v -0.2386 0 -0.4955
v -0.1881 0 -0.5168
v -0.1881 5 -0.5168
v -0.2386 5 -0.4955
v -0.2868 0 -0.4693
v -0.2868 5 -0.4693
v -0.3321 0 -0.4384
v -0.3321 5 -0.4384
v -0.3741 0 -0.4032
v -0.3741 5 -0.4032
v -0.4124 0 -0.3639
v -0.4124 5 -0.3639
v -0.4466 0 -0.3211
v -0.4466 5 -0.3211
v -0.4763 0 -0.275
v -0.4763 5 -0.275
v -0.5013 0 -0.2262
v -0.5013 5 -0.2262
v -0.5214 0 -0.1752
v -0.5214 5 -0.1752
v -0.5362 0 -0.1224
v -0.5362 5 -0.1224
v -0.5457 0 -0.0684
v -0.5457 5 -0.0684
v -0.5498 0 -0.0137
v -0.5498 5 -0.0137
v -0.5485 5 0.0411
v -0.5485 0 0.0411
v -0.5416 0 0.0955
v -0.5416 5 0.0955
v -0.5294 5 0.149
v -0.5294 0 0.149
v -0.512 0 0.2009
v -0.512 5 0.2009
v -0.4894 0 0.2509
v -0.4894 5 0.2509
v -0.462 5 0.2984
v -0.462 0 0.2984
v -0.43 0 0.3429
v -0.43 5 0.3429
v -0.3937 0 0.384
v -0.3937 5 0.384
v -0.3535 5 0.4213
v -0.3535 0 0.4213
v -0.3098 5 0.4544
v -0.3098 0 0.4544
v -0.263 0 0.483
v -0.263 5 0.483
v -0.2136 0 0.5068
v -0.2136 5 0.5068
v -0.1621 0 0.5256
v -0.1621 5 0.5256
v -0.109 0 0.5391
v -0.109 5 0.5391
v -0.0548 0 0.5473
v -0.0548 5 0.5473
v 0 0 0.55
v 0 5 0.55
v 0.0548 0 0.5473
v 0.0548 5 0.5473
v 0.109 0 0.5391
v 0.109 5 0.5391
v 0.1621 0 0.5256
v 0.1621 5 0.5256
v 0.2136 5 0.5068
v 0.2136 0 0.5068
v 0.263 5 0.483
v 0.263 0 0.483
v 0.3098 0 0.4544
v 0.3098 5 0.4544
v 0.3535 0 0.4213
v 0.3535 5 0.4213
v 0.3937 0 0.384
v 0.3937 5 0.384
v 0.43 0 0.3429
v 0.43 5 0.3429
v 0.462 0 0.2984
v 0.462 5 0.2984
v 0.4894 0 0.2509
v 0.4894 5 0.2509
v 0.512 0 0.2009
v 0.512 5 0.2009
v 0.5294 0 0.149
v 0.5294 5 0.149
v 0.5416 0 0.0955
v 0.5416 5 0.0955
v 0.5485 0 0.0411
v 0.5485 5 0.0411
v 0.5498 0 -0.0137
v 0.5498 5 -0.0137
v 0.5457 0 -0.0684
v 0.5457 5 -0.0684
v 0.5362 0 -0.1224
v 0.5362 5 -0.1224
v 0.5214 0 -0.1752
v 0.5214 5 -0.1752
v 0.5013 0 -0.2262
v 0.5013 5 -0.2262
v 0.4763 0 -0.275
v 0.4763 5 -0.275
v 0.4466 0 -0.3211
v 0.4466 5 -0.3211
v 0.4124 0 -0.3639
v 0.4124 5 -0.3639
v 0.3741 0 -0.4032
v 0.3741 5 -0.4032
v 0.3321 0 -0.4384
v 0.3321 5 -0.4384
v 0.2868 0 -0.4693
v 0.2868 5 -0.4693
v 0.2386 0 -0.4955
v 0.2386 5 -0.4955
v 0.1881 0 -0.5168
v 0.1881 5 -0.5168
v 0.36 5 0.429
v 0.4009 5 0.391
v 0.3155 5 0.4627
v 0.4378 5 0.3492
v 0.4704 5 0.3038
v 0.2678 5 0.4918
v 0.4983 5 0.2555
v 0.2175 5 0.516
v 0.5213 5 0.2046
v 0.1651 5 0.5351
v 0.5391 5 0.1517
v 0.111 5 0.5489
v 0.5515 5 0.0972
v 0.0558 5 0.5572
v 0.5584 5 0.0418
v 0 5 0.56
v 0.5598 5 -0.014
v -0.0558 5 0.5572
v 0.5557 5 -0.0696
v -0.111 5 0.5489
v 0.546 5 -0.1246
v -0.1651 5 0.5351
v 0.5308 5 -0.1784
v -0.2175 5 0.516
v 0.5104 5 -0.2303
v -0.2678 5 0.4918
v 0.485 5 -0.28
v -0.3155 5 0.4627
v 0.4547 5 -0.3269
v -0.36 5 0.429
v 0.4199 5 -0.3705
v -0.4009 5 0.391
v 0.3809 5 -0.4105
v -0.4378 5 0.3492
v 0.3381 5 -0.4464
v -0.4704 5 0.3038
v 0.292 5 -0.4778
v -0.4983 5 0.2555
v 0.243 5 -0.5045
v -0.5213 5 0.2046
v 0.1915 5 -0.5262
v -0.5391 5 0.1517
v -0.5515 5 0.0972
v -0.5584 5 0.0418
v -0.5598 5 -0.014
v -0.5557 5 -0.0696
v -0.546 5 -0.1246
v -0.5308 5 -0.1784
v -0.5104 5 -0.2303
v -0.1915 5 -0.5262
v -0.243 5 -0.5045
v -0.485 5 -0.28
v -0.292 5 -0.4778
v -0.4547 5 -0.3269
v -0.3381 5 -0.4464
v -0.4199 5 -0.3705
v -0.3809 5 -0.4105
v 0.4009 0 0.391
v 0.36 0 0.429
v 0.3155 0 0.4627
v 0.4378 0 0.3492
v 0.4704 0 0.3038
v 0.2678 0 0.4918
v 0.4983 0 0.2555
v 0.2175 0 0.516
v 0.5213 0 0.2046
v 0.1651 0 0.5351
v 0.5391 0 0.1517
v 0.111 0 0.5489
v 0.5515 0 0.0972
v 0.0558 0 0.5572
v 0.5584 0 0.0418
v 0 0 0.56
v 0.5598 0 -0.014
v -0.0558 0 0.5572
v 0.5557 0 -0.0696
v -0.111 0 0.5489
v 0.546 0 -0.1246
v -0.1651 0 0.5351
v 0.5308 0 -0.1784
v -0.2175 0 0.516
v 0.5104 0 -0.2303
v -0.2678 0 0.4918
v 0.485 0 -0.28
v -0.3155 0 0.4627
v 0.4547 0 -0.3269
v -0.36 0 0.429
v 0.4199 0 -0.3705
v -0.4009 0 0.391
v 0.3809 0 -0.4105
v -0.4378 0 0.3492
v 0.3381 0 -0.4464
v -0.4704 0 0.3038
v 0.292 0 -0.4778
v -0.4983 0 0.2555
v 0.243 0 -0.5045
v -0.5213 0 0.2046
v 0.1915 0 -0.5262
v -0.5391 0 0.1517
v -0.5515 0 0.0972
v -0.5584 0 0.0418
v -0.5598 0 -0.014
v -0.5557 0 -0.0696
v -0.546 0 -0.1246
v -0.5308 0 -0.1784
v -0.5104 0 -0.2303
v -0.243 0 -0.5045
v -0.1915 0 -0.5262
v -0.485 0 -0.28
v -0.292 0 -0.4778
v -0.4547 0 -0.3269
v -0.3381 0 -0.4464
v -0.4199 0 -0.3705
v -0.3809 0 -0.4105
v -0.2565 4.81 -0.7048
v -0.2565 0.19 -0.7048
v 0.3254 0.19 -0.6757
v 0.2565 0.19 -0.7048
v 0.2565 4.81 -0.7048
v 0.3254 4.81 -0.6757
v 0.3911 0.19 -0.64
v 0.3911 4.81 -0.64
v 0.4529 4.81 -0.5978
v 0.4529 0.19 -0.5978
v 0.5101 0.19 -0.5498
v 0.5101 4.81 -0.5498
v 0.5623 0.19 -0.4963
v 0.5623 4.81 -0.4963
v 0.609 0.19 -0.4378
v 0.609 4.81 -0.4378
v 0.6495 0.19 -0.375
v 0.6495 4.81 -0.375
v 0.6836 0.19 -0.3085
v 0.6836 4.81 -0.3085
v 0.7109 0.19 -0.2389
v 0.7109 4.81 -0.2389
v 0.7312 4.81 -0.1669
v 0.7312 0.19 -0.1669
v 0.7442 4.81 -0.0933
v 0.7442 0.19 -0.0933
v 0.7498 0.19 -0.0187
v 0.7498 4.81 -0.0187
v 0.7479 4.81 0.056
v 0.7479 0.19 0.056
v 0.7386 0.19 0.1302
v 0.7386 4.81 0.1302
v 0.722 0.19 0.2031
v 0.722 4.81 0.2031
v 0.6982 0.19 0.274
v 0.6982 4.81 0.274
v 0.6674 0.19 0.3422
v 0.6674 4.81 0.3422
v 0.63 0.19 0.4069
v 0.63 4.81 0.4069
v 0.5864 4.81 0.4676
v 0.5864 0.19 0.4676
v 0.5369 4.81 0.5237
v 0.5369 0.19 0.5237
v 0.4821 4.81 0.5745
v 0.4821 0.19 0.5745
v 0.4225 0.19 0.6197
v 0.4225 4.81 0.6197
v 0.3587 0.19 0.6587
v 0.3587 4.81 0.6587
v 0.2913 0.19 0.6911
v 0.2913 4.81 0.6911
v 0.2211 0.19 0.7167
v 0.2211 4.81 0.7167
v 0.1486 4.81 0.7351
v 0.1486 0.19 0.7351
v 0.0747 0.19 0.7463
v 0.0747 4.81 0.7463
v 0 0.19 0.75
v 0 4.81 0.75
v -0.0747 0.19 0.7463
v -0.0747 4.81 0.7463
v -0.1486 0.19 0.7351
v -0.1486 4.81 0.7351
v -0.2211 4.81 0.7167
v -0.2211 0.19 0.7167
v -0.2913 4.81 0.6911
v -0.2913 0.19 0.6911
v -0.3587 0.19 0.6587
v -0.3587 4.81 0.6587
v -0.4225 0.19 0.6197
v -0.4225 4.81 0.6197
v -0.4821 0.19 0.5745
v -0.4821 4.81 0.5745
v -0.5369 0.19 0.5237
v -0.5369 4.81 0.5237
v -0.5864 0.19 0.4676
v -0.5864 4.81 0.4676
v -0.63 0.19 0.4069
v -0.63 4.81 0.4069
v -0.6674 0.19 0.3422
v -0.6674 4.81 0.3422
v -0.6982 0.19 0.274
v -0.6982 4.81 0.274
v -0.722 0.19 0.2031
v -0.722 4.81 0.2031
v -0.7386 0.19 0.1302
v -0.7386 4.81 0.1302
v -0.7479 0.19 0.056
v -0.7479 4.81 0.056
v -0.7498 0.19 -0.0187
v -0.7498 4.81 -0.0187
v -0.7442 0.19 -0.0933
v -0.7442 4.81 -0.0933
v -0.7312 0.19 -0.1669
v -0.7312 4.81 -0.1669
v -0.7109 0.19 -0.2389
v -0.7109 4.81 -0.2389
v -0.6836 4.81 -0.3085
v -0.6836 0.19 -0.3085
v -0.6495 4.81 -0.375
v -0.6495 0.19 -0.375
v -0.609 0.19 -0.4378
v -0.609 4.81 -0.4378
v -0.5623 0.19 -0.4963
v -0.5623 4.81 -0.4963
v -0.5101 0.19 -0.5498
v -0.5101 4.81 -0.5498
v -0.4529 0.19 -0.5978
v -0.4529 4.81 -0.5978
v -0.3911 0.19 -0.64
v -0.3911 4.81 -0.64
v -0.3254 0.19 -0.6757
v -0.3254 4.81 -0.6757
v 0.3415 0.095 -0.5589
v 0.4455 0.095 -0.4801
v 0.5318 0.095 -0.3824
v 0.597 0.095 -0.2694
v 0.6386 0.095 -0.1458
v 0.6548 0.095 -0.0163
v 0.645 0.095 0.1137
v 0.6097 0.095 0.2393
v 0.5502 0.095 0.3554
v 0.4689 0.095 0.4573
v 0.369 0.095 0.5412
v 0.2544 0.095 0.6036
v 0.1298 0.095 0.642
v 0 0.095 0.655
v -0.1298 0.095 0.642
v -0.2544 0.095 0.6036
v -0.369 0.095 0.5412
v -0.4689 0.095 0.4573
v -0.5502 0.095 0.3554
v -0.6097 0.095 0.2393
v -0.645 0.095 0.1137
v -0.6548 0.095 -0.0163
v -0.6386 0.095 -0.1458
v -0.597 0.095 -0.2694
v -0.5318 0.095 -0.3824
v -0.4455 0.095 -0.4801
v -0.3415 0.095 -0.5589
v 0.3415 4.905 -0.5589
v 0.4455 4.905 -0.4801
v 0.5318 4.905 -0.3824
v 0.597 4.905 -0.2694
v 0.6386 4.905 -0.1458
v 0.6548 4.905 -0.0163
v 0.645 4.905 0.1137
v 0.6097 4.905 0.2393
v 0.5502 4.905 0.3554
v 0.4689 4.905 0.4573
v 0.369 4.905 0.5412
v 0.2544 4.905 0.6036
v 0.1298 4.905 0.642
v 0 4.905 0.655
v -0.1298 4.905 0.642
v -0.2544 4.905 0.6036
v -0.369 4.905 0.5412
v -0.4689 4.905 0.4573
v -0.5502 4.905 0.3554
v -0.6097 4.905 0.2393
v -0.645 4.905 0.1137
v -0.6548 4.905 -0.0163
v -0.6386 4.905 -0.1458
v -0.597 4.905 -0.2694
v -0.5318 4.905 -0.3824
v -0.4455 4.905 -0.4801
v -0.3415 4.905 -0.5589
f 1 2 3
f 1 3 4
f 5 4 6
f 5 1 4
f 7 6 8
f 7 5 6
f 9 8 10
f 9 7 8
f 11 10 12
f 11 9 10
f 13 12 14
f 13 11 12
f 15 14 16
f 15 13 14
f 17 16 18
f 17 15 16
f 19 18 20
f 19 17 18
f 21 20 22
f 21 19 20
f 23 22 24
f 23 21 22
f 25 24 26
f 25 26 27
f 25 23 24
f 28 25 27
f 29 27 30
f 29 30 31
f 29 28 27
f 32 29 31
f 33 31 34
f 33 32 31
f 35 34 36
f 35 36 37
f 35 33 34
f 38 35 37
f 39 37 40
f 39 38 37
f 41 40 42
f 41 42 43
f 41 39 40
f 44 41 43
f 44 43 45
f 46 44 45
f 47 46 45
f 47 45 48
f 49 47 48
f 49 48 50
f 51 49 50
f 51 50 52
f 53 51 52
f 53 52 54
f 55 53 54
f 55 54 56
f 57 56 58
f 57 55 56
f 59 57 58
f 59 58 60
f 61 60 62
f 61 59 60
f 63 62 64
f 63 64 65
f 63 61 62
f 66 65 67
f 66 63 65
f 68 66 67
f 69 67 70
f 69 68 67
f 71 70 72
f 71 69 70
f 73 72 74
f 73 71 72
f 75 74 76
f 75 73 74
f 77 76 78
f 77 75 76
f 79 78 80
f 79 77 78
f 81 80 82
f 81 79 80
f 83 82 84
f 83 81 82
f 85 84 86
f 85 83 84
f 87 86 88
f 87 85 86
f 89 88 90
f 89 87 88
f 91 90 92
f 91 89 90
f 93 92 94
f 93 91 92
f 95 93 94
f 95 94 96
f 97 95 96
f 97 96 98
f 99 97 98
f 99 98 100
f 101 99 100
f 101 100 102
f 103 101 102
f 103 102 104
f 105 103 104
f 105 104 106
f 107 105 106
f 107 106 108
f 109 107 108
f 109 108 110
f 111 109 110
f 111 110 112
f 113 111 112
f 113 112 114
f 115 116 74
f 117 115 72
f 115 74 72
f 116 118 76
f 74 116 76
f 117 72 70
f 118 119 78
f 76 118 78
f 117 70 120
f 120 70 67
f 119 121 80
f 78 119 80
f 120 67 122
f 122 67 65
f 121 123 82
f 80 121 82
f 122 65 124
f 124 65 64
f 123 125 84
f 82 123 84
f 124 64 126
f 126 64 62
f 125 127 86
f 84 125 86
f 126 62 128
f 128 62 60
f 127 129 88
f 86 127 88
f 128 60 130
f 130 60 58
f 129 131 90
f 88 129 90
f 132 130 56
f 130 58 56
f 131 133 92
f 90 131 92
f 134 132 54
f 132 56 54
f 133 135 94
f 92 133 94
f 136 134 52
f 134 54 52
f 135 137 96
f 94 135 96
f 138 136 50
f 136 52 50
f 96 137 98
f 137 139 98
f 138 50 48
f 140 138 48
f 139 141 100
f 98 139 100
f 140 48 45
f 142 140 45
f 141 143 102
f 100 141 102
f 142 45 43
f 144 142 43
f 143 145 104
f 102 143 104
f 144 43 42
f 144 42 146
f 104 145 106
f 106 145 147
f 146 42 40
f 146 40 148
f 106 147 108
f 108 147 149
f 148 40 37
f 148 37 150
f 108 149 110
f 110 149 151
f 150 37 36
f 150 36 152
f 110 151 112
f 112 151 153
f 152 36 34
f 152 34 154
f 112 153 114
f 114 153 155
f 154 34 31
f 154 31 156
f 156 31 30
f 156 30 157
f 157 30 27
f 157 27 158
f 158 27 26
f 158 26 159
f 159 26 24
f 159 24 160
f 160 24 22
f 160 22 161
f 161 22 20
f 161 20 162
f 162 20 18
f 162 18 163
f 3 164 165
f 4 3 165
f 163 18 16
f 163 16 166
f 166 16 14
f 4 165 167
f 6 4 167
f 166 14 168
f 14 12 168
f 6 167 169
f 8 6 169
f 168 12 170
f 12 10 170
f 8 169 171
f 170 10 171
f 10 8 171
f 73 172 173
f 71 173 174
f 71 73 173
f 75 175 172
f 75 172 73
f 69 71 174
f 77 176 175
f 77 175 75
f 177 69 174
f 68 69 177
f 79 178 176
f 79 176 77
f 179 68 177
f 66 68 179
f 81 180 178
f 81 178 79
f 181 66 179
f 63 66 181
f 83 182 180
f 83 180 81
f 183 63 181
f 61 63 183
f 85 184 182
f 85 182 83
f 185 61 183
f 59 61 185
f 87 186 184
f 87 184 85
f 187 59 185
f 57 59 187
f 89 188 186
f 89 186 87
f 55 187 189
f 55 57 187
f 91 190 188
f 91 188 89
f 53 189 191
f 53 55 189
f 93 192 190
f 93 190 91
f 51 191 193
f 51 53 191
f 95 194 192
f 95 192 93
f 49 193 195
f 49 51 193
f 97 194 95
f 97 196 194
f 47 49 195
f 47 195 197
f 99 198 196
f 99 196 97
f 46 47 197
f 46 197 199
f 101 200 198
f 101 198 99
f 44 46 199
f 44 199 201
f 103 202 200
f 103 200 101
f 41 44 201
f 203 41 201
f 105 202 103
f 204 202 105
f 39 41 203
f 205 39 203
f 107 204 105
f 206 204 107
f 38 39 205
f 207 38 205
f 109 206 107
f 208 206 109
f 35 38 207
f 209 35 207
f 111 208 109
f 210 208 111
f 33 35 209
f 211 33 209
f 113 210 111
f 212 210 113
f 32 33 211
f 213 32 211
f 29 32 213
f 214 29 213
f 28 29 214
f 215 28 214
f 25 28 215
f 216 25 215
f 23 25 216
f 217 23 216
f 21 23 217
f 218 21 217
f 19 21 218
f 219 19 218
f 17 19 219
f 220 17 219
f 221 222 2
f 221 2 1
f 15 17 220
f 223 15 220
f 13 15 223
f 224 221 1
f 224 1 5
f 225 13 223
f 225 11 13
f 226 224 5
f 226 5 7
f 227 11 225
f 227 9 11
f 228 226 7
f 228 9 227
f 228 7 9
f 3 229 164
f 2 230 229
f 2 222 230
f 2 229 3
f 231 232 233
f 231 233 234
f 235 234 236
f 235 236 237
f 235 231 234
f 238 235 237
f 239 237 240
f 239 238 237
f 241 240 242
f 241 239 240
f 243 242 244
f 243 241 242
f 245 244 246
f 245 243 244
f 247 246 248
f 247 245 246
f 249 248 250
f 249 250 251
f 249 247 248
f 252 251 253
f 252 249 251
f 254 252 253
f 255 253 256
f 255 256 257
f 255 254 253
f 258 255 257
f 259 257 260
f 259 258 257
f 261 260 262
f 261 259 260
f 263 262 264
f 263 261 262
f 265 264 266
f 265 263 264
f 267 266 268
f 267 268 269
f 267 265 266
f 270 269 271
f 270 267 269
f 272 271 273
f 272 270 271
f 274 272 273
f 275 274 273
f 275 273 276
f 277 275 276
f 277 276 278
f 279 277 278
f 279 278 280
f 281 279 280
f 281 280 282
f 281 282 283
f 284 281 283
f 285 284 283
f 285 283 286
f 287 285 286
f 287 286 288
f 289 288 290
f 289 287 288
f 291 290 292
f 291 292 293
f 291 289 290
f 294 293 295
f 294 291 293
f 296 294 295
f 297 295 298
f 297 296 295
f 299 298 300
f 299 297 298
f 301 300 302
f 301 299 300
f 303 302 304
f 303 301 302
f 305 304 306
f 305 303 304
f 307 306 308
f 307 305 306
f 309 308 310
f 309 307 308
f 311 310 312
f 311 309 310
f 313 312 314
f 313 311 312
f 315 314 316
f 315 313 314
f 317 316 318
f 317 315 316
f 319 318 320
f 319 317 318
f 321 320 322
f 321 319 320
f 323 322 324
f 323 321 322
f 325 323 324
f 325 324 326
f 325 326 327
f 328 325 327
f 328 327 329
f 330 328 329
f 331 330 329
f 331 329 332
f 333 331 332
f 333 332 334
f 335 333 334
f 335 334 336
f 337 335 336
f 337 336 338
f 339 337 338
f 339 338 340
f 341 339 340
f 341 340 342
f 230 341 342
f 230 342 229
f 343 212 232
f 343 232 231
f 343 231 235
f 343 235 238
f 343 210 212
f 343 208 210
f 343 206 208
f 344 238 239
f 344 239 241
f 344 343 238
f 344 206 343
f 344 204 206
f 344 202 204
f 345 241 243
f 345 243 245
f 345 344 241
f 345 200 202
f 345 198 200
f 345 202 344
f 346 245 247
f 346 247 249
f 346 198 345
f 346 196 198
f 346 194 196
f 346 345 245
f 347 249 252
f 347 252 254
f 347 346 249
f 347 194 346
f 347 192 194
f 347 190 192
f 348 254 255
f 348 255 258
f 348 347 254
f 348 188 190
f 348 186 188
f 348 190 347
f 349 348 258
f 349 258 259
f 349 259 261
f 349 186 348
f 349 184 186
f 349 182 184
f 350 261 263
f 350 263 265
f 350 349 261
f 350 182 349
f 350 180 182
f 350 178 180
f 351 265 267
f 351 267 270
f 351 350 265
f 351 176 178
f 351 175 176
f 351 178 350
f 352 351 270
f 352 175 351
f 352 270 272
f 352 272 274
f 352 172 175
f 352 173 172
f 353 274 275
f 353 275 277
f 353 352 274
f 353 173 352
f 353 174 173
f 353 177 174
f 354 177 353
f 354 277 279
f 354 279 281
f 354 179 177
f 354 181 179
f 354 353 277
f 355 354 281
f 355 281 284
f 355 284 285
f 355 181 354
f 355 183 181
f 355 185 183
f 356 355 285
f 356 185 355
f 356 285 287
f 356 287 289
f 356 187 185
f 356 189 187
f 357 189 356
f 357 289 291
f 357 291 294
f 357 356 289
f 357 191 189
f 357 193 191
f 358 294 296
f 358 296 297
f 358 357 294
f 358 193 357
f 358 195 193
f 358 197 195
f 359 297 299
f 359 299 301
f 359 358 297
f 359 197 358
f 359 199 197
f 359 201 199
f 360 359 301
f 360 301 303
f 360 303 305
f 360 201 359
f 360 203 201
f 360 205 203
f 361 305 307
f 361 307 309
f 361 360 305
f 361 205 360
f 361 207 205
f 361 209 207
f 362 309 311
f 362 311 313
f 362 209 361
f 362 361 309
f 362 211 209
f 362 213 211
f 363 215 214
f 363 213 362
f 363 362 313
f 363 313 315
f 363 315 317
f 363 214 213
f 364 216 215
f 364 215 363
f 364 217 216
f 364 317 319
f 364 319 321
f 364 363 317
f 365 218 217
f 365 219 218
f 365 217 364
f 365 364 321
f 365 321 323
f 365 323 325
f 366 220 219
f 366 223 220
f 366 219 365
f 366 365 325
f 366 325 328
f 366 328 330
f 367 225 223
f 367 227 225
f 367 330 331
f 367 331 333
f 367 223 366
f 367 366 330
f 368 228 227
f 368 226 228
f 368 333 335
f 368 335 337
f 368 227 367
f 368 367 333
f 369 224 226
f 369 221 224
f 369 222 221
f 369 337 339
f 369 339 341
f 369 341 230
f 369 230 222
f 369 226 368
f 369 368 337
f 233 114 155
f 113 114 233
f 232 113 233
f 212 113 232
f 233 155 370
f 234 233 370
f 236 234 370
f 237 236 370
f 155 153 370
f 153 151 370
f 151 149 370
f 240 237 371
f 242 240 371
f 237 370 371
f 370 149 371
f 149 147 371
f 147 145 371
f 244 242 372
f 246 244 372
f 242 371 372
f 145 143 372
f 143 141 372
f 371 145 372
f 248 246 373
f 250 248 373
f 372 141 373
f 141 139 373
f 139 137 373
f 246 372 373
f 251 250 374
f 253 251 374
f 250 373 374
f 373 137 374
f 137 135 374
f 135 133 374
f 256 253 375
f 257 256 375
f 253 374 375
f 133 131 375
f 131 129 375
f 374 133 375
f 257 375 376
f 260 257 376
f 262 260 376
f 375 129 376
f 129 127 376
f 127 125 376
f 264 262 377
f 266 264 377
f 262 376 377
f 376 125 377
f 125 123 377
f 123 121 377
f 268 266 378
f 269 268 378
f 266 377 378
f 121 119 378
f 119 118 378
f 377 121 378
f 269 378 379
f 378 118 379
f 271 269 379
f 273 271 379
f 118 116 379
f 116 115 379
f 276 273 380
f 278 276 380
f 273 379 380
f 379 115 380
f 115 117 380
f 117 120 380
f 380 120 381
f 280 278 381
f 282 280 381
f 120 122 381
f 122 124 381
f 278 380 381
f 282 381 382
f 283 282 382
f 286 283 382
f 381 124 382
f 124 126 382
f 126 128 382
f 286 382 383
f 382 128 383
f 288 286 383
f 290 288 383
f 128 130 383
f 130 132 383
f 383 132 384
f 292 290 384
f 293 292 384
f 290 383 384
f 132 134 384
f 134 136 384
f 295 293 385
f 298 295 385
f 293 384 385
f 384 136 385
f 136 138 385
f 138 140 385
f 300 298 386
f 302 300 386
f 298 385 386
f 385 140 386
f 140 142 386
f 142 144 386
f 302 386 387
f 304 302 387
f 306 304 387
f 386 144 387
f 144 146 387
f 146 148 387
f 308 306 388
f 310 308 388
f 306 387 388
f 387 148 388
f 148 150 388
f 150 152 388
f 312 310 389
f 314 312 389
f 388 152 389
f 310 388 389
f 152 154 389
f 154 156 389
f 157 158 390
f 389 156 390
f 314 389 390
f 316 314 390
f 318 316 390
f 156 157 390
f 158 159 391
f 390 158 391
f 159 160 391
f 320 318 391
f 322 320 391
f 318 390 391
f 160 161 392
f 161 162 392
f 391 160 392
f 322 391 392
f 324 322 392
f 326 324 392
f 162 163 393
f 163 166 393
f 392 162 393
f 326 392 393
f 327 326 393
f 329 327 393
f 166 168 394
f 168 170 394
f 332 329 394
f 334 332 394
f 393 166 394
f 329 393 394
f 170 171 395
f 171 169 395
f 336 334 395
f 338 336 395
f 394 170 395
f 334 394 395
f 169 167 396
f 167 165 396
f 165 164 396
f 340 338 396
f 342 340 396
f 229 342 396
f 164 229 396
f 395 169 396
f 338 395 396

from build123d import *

# Parameters (mm, degrees)
EXTRUDE_LENGTH_DEPTH = 5
END_CHAMFERS_SIZE    = 0.19


with BuildPart() as part:
    # Cross Section Sketch → Extrude Length (new body)
    with BuildSketch(Plane(origin=(0, 0, 0), x_dir=(1, 0, 0), z_dir=(0, 1, 0))):
        with BuildLine():
            Line((0.188111079, 0.516830941), (0.256515107, 0.704769466))
            ThreePointArc((0.256515107, 0.704769466), (0, -0.75), (-0.256515107, 0.704769466))
            Line((-0.256515107, 0.704769466), (-0.188111079, 0.516830941))
            ThreePointArc((-0.188111079, 0.516830941), (0, -0.55), (0.188111079, 0.516830941))
        make_face()
    extrude(amount=EXTRUDE_LENGTH_DEPTH)

    # End Chamfers
    end_chamfers_edges = [part.edges().sort_by_distance(p)[0] for p in [
        (0, 5, 0.75),
        (0, 0, 0.75),
    ]]
    chamfer(end_chamfers_edges, length=END_CHAMFERS_SIZE)


solid = part.part
